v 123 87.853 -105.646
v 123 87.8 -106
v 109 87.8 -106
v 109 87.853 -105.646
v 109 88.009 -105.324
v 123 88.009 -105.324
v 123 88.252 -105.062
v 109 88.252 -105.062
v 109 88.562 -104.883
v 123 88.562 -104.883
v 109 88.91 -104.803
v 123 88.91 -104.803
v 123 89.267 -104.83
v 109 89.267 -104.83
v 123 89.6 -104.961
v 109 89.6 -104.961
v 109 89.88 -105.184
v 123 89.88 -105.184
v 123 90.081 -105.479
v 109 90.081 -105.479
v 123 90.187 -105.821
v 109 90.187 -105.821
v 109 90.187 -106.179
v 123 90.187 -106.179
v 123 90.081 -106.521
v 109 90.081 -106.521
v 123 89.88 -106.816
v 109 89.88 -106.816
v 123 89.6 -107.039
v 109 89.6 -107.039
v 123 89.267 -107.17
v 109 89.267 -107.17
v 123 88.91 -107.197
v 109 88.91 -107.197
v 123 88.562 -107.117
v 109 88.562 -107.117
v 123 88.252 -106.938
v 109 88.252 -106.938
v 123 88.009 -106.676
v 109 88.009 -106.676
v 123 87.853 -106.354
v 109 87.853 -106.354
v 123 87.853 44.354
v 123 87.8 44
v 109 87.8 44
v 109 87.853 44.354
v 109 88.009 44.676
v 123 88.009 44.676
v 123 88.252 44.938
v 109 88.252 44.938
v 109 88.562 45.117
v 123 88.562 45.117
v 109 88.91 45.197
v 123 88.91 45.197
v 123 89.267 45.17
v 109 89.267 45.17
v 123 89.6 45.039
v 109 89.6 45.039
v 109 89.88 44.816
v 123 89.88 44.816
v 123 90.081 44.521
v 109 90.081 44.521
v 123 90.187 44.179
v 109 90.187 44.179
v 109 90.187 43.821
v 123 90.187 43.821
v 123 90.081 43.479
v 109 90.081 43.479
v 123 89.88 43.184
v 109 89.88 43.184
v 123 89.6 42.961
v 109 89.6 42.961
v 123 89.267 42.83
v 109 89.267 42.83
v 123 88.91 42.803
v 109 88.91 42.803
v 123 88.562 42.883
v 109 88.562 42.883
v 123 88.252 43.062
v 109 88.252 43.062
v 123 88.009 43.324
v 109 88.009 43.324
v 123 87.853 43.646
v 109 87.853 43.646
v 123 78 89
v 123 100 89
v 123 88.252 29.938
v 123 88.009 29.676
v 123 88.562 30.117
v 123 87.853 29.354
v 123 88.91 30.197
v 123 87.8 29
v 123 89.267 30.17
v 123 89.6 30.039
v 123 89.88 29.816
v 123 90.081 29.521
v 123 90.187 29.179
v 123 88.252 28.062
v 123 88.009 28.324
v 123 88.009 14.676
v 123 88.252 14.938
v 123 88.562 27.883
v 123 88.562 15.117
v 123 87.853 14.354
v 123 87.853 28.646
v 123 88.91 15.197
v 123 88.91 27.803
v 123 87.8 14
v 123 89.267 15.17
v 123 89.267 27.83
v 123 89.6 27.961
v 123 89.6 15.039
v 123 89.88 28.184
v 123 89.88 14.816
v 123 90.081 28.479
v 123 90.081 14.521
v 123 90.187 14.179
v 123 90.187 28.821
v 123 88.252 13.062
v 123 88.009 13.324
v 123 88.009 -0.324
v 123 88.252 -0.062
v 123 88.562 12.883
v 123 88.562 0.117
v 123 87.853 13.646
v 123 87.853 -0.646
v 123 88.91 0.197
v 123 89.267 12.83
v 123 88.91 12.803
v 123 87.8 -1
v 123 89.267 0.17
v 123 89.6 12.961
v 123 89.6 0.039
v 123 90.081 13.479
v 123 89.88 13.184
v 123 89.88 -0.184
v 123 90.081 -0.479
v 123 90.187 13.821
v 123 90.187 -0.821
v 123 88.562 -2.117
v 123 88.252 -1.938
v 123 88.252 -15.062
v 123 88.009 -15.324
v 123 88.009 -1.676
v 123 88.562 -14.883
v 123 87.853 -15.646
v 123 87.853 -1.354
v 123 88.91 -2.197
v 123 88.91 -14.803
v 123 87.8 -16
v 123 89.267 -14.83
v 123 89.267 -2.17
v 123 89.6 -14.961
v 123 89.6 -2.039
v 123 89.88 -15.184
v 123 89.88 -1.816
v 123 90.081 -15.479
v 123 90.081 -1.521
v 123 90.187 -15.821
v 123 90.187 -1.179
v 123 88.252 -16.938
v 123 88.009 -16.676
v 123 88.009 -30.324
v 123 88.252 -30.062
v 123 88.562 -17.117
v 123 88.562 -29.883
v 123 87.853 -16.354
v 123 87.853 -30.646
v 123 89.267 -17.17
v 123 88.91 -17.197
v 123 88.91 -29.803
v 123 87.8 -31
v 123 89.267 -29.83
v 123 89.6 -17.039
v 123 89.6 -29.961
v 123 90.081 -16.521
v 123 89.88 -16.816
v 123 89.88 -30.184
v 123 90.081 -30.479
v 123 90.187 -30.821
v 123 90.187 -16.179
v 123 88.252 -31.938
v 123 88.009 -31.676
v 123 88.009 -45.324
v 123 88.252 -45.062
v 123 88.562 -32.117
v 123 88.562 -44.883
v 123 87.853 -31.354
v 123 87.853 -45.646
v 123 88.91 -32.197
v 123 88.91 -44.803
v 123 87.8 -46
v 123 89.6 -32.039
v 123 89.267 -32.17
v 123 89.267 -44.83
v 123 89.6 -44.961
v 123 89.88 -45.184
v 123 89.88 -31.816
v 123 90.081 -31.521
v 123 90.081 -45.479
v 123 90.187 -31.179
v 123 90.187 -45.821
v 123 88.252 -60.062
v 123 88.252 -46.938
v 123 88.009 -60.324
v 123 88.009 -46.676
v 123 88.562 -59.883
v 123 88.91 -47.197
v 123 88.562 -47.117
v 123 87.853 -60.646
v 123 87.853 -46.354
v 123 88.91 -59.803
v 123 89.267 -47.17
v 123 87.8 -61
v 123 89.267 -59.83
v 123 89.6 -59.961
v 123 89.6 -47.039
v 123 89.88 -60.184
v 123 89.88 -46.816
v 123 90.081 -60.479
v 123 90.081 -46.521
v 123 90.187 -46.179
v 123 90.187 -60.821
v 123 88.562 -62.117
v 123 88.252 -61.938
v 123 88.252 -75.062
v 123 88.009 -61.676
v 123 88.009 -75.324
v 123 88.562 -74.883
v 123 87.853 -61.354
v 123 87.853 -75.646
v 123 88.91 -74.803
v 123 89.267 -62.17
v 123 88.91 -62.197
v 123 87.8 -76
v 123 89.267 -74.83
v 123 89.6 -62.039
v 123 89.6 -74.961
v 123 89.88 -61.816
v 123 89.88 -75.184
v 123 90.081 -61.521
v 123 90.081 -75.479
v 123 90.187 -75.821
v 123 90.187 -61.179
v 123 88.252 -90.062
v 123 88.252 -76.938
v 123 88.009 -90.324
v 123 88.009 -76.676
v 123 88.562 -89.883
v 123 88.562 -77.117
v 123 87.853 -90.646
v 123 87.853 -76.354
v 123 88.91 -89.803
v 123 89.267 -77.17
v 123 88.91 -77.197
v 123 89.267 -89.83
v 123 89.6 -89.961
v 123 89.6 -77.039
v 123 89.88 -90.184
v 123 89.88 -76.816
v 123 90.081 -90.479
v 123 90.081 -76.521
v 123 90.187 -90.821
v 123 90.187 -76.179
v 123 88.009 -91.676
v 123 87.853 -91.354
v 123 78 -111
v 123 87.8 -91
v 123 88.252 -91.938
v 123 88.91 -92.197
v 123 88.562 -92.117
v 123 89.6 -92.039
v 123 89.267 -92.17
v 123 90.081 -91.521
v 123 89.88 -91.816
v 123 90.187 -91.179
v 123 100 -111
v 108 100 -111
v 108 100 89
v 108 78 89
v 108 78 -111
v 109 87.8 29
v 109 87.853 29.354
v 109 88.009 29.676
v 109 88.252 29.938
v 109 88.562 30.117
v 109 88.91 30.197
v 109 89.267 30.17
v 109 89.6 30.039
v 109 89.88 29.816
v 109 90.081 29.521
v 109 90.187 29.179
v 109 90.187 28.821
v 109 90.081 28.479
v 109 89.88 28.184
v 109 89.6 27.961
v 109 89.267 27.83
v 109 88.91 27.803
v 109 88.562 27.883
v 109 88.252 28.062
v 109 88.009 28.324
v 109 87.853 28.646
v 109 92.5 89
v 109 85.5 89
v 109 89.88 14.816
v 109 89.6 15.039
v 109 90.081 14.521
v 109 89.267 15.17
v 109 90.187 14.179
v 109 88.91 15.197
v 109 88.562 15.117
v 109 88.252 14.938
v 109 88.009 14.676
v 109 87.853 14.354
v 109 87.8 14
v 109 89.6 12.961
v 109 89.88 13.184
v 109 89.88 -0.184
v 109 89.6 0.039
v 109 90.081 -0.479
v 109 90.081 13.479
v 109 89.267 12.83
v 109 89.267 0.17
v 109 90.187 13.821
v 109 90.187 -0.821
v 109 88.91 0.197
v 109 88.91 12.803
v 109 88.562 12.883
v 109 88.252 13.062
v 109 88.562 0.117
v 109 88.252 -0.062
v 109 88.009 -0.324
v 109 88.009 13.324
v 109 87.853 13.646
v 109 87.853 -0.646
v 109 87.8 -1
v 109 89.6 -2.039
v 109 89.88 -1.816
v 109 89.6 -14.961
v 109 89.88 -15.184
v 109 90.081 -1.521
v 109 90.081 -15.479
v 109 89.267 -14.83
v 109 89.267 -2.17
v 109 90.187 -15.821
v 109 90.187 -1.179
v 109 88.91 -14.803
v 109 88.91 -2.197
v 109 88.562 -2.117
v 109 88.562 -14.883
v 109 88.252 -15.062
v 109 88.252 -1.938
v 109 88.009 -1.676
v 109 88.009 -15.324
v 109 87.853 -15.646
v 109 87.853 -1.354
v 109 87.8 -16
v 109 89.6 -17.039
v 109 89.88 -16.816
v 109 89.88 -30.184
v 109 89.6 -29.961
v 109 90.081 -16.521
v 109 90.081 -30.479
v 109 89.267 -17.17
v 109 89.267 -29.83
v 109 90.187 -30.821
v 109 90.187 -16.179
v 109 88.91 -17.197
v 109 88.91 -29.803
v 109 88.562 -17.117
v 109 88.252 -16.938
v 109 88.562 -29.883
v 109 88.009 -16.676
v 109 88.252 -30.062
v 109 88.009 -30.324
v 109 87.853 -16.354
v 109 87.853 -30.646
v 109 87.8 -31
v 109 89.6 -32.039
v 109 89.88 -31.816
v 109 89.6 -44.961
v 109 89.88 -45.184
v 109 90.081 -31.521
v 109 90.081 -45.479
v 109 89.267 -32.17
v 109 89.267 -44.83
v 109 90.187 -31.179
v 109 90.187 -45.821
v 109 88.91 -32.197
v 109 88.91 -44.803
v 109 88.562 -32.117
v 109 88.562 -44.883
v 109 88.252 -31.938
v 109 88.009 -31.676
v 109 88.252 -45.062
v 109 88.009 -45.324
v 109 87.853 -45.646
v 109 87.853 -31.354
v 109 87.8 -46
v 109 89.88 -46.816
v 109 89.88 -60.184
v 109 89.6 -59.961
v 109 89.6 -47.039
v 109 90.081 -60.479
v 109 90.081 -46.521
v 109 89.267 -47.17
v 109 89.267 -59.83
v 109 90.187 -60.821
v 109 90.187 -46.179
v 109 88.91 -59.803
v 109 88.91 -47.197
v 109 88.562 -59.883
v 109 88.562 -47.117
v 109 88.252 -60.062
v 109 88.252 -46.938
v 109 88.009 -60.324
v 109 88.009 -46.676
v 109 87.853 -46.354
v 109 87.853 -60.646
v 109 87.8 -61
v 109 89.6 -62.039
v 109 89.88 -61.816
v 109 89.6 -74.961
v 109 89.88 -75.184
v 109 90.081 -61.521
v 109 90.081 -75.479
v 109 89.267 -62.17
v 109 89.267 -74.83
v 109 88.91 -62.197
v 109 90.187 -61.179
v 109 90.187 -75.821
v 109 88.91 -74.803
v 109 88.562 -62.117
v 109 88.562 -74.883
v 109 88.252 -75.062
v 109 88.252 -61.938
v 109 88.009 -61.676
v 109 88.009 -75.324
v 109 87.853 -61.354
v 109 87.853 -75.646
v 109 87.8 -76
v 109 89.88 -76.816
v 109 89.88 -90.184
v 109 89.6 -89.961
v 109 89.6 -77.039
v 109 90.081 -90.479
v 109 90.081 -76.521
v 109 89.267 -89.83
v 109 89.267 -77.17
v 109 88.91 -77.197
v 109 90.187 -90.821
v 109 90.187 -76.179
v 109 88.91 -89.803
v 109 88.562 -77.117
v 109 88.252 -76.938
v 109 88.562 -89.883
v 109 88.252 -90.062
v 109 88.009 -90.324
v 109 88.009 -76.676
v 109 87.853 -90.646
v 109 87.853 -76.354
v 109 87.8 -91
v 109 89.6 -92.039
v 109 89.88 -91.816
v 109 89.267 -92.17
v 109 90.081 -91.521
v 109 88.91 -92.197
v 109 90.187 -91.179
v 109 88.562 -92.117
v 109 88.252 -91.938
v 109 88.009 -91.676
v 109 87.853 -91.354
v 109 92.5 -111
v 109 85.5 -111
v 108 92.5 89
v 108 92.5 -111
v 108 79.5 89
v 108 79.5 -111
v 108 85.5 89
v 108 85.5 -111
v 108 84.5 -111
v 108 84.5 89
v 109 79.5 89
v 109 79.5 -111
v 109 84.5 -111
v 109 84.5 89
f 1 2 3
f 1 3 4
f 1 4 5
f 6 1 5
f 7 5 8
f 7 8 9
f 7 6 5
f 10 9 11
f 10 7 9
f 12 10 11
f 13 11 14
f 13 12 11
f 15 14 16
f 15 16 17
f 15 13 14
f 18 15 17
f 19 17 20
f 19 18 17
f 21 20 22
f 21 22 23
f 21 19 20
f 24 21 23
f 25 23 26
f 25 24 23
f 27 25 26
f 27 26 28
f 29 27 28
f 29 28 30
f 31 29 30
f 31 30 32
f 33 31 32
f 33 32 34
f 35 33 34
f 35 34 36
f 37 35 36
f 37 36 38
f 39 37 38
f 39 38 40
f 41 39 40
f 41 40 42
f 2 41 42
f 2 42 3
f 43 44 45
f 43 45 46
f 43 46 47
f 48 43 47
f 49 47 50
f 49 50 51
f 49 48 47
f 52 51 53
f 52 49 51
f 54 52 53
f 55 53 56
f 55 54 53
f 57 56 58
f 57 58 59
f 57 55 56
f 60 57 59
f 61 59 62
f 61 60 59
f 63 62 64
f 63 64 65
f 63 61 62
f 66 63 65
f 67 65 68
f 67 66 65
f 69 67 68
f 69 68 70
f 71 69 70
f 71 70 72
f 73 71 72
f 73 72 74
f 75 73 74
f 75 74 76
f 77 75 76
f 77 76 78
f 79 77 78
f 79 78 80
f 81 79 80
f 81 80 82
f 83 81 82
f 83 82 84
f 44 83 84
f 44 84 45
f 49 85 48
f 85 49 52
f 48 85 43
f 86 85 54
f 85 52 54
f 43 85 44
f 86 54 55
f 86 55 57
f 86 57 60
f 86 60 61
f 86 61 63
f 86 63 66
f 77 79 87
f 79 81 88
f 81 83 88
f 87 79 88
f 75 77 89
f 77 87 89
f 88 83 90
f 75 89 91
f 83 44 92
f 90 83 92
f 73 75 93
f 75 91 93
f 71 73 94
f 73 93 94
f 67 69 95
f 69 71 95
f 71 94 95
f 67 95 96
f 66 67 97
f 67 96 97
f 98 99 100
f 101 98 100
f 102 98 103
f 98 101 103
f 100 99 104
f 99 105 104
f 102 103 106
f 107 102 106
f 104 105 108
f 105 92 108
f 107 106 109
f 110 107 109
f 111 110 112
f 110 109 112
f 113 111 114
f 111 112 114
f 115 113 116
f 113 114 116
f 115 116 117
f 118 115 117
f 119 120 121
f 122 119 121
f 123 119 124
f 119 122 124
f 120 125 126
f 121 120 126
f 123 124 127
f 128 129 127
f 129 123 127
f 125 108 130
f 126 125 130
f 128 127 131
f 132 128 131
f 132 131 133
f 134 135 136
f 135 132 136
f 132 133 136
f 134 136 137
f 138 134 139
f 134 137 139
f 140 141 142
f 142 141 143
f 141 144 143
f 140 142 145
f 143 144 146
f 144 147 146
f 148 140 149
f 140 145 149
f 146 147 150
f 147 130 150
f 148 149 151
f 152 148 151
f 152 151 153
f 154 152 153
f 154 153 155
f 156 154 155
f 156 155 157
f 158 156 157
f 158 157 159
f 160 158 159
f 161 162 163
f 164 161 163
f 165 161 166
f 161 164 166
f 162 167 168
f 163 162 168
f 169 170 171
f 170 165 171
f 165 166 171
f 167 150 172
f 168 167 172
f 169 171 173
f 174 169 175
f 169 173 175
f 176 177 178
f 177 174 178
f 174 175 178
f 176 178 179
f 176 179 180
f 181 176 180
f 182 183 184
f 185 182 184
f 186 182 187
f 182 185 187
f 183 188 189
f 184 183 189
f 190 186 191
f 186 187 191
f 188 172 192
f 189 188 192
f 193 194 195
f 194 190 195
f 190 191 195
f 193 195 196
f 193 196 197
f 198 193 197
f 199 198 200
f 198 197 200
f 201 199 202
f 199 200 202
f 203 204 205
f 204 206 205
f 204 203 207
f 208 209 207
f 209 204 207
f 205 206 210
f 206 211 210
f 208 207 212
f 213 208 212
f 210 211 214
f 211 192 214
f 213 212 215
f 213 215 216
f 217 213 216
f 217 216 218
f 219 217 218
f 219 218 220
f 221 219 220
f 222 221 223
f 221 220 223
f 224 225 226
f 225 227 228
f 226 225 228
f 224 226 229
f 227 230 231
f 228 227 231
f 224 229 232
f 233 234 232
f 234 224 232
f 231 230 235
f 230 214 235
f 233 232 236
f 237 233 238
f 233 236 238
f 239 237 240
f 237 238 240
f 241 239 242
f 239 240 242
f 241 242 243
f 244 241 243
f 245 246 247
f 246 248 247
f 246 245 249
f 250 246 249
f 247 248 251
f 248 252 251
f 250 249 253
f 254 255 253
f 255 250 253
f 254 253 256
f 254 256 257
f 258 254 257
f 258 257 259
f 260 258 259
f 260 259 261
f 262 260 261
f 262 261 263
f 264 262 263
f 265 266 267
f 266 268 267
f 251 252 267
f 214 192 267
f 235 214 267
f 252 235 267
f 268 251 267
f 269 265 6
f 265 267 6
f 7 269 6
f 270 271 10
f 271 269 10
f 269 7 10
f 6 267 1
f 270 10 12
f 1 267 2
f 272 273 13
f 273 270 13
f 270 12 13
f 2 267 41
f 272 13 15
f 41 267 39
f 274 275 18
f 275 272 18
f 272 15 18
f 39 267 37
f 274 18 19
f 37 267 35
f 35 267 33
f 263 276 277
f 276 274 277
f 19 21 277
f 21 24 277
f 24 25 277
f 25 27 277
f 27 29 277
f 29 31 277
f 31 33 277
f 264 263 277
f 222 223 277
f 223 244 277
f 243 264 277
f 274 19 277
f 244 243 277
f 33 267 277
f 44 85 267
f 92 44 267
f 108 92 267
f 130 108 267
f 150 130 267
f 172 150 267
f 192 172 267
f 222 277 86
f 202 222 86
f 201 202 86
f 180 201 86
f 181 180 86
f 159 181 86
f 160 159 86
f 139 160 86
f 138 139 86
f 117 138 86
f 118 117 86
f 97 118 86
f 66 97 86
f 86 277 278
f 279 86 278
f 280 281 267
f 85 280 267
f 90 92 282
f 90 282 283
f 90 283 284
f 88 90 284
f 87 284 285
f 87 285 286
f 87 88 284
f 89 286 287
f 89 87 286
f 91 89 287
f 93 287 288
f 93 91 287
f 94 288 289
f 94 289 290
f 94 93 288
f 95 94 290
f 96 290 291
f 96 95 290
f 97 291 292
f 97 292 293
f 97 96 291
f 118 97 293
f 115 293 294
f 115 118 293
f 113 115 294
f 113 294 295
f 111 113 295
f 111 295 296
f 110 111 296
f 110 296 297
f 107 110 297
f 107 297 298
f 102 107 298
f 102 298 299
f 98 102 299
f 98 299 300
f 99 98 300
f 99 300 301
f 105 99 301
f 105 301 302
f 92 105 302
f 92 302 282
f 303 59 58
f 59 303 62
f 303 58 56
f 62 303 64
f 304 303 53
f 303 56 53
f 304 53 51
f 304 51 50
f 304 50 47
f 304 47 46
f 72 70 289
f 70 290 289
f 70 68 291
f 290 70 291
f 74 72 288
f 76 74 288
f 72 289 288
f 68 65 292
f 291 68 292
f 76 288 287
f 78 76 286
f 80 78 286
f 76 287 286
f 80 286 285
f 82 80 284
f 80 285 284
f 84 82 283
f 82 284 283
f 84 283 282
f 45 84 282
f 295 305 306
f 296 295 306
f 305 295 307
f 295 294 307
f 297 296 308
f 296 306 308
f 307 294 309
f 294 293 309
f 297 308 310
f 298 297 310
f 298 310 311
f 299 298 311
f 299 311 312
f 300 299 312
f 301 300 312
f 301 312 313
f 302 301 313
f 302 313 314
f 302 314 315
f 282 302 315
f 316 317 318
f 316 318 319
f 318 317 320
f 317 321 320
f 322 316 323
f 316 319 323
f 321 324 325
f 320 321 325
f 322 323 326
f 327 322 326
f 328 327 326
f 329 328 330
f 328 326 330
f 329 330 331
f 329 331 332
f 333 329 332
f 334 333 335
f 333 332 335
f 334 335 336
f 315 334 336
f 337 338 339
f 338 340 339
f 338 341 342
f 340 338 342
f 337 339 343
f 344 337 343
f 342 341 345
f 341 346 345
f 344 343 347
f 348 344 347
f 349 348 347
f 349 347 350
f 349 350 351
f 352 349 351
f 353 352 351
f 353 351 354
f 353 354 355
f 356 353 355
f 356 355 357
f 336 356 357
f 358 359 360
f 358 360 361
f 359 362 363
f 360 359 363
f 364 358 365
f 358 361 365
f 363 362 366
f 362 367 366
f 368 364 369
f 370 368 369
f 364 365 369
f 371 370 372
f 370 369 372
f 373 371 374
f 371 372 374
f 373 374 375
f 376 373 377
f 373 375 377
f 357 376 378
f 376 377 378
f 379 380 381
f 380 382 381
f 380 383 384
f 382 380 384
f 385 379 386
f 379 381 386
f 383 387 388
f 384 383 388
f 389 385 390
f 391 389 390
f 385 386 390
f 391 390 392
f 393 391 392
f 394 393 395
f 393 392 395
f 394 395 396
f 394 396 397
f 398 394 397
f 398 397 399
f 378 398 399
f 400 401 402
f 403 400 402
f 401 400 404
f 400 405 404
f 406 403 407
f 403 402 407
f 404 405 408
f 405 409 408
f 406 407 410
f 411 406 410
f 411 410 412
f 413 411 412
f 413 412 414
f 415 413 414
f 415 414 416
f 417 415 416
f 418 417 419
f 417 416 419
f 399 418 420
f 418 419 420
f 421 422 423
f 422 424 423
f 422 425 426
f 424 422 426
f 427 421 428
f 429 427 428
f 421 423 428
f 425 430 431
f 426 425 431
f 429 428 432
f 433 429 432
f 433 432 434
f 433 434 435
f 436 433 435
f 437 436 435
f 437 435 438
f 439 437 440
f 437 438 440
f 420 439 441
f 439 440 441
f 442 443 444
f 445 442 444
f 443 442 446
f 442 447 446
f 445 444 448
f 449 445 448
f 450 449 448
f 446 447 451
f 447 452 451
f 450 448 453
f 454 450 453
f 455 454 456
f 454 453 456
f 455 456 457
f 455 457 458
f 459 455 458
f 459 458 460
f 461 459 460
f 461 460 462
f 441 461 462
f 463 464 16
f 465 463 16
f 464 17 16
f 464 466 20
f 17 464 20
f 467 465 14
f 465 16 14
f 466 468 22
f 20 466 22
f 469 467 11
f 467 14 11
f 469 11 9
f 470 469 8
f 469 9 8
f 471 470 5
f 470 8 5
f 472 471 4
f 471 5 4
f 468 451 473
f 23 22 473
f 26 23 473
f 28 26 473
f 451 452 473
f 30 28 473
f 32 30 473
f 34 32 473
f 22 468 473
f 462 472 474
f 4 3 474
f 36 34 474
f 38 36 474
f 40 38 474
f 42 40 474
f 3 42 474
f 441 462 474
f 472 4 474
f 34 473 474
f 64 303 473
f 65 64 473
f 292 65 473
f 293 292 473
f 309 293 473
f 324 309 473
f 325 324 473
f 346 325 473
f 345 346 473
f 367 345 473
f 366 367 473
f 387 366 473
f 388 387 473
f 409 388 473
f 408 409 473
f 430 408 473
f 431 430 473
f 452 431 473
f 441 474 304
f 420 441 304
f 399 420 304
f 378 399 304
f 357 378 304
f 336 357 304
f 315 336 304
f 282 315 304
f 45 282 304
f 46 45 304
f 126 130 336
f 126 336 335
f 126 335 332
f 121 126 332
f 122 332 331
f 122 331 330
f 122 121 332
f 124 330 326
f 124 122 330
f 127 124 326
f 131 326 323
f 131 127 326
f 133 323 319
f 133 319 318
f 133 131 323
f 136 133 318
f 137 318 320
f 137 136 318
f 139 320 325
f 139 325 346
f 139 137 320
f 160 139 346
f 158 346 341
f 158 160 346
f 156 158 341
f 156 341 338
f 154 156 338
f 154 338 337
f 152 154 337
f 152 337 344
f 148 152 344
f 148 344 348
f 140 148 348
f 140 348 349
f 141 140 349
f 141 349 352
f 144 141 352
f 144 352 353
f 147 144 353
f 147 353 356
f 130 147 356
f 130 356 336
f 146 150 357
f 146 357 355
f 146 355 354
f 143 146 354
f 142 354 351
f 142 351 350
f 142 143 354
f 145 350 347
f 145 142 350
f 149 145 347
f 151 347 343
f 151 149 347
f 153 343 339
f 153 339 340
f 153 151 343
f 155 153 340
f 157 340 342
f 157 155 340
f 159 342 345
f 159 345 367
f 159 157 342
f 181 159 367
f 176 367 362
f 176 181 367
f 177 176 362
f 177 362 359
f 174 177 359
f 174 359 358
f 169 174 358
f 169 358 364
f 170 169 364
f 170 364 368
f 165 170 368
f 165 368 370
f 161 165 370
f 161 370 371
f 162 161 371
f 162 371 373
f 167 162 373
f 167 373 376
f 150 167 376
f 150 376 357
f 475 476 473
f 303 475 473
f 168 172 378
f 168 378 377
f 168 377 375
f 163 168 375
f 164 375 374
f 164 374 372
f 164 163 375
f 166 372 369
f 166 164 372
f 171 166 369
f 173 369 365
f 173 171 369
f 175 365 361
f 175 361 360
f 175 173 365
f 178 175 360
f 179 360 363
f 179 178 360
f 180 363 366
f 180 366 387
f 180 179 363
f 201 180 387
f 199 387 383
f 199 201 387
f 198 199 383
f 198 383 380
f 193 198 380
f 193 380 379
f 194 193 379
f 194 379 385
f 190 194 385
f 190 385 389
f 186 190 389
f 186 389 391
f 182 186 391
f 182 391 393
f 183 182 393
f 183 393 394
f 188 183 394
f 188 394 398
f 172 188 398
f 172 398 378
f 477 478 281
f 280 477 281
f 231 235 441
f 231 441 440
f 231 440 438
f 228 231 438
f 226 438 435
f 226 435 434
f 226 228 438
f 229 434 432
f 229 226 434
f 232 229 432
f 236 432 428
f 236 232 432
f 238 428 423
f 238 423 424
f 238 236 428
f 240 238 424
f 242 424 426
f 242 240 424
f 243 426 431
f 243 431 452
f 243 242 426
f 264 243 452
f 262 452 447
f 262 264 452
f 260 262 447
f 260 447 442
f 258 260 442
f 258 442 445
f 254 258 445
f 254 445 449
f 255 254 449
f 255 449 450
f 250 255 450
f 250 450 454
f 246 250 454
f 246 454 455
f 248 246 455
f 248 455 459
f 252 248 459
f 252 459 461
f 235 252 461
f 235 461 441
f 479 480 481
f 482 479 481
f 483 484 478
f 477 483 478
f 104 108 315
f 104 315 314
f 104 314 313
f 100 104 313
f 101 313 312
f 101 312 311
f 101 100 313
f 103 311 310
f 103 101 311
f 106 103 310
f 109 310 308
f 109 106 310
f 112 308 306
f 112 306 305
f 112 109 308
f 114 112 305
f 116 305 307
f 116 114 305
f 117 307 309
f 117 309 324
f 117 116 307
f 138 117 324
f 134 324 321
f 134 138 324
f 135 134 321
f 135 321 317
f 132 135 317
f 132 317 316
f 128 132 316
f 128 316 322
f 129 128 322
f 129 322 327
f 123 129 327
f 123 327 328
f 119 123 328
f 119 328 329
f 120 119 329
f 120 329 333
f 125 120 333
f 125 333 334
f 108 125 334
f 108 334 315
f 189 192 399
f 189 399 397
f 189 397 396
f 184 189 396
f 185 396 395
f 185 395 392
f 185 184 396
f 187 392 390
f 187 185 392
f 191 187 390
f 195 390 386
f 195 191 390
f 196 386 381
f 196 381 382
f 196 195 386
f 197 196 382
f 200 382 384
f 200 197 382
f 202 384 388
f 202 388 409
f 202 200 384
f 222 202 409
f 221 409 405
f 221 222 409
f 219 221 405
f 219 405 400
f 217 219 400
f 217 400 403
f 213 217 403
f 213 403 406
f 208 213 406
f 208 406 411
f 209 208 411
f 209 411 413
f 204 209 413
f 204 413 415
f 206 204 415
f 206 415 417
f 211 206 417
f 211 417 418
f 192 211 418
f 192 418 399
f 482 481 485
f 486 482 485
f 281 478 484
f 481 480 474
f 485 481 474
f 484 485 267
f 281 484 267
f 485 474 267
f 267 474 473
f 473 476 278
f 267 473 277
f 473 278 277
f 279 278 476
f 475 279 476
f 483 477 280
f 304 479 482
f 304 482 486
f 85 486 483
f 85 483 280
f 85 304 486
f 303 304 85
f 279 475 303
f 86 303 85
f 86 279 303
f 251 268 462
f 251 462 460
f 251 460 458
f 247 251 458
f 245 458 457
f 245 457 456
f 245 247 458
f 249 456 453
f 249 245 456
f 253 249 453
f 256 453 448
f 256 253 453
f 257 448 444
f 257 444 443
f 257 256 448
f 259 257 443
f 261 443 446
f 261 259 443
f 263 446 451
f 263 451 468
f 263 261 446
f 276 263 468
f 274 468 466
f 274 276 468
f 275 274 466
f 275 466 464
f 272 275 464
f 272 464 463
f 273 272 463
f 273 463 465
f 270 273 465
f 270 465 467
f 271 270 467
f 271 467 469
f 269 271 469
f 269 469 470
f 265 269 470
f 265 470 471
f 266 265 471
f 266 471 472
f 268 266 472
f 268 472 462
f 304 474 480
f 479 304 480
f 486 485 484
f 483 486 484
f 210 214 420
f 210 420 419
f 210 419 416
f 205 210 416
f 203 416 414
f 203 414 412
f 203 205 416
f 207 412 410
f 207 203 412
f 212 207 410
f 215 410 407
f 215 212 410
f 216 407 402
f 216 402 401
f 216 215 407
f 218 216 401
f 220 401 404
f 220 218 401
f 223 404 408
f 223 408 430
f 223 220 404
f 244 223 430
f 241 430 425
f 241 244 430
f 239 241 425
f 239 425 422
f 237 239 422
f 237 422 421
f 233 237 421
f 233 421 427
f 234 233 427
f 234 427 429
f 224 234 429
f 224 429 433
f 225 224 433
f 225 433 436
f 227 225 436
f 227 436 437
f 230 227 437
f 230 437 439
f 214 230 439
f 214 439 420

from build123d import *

# Parameters (mm, degrees)
PAD019_DEPTH    = 200
SKETCH043_R     = 1.2
POCKET023_DEPTH = 15


with BuildPart() as body010:
    # Sketch042 → Pad019 (new body)
    with BuildSketch(Plane.XY):
        Polygon((0, 22), (15, 22), (15, 14.5), (14, 14.5), (14, 7.5), (15, 7.5), (15, 6.5), (14, 6.5), (14, 1.5), (15, 1.5), (15, 0), (0, 0), align=None)
    extrude(amount=PAD019_DEPTH)

    # Sketch043 (on Face7 of Pad019) → Pocket023 (cut)
    with BuildSketch(Plane(origin=(0, 0, 0), x_dir=(0, -1, 0), z_dir=(-1, 0, 0))):
        with Locations((-11, 5)):
            Circle(SKETCH043_R)
        with Locations((-11, 35)):
            Circle(SKETCH043_R)
        with Locations((-11, 65)):
            Circle(SKETCH043_R)
        with Locations((-11, 110)):
            Circle(SKETCH043_R)
        with Locations((-11, 95)):
            Circle(SKETCH043_R)
        with Locations((-11, 80)):
            Circle(SKETCH043_R)
        with Locations((-11, 50)):
            Circle(SKETCH043_R)
        with Locations((-11, 20)):
            Circle(SKETCH043_R)
        with Locations((-11, 140)):
            Circle(SKETCH043_R)
        with Locations((-11, 125)):
            Circle(SKETCH043_R)
        with Locations((-11, 155)):
            Circle(SKETCH043_R)
    extrude(amount=-POCKET023_DEPTH, mode=Mode.SUBTRACT)


with BuildPart() as body010_1:
    # Body010 placement: moved
    add(body010.part.moved(Location((-123, 78, -111))))


with BuildPart() as part_mirroring001:
    # Part__Mirroring001: instance of Body010
    add(body010_1.part.mirror(Plane(origin=(0, 0, 0), x_dir=(0, -1, 0), z_dir=(1, 0, 0))))


solid = part_mirroring001.part
